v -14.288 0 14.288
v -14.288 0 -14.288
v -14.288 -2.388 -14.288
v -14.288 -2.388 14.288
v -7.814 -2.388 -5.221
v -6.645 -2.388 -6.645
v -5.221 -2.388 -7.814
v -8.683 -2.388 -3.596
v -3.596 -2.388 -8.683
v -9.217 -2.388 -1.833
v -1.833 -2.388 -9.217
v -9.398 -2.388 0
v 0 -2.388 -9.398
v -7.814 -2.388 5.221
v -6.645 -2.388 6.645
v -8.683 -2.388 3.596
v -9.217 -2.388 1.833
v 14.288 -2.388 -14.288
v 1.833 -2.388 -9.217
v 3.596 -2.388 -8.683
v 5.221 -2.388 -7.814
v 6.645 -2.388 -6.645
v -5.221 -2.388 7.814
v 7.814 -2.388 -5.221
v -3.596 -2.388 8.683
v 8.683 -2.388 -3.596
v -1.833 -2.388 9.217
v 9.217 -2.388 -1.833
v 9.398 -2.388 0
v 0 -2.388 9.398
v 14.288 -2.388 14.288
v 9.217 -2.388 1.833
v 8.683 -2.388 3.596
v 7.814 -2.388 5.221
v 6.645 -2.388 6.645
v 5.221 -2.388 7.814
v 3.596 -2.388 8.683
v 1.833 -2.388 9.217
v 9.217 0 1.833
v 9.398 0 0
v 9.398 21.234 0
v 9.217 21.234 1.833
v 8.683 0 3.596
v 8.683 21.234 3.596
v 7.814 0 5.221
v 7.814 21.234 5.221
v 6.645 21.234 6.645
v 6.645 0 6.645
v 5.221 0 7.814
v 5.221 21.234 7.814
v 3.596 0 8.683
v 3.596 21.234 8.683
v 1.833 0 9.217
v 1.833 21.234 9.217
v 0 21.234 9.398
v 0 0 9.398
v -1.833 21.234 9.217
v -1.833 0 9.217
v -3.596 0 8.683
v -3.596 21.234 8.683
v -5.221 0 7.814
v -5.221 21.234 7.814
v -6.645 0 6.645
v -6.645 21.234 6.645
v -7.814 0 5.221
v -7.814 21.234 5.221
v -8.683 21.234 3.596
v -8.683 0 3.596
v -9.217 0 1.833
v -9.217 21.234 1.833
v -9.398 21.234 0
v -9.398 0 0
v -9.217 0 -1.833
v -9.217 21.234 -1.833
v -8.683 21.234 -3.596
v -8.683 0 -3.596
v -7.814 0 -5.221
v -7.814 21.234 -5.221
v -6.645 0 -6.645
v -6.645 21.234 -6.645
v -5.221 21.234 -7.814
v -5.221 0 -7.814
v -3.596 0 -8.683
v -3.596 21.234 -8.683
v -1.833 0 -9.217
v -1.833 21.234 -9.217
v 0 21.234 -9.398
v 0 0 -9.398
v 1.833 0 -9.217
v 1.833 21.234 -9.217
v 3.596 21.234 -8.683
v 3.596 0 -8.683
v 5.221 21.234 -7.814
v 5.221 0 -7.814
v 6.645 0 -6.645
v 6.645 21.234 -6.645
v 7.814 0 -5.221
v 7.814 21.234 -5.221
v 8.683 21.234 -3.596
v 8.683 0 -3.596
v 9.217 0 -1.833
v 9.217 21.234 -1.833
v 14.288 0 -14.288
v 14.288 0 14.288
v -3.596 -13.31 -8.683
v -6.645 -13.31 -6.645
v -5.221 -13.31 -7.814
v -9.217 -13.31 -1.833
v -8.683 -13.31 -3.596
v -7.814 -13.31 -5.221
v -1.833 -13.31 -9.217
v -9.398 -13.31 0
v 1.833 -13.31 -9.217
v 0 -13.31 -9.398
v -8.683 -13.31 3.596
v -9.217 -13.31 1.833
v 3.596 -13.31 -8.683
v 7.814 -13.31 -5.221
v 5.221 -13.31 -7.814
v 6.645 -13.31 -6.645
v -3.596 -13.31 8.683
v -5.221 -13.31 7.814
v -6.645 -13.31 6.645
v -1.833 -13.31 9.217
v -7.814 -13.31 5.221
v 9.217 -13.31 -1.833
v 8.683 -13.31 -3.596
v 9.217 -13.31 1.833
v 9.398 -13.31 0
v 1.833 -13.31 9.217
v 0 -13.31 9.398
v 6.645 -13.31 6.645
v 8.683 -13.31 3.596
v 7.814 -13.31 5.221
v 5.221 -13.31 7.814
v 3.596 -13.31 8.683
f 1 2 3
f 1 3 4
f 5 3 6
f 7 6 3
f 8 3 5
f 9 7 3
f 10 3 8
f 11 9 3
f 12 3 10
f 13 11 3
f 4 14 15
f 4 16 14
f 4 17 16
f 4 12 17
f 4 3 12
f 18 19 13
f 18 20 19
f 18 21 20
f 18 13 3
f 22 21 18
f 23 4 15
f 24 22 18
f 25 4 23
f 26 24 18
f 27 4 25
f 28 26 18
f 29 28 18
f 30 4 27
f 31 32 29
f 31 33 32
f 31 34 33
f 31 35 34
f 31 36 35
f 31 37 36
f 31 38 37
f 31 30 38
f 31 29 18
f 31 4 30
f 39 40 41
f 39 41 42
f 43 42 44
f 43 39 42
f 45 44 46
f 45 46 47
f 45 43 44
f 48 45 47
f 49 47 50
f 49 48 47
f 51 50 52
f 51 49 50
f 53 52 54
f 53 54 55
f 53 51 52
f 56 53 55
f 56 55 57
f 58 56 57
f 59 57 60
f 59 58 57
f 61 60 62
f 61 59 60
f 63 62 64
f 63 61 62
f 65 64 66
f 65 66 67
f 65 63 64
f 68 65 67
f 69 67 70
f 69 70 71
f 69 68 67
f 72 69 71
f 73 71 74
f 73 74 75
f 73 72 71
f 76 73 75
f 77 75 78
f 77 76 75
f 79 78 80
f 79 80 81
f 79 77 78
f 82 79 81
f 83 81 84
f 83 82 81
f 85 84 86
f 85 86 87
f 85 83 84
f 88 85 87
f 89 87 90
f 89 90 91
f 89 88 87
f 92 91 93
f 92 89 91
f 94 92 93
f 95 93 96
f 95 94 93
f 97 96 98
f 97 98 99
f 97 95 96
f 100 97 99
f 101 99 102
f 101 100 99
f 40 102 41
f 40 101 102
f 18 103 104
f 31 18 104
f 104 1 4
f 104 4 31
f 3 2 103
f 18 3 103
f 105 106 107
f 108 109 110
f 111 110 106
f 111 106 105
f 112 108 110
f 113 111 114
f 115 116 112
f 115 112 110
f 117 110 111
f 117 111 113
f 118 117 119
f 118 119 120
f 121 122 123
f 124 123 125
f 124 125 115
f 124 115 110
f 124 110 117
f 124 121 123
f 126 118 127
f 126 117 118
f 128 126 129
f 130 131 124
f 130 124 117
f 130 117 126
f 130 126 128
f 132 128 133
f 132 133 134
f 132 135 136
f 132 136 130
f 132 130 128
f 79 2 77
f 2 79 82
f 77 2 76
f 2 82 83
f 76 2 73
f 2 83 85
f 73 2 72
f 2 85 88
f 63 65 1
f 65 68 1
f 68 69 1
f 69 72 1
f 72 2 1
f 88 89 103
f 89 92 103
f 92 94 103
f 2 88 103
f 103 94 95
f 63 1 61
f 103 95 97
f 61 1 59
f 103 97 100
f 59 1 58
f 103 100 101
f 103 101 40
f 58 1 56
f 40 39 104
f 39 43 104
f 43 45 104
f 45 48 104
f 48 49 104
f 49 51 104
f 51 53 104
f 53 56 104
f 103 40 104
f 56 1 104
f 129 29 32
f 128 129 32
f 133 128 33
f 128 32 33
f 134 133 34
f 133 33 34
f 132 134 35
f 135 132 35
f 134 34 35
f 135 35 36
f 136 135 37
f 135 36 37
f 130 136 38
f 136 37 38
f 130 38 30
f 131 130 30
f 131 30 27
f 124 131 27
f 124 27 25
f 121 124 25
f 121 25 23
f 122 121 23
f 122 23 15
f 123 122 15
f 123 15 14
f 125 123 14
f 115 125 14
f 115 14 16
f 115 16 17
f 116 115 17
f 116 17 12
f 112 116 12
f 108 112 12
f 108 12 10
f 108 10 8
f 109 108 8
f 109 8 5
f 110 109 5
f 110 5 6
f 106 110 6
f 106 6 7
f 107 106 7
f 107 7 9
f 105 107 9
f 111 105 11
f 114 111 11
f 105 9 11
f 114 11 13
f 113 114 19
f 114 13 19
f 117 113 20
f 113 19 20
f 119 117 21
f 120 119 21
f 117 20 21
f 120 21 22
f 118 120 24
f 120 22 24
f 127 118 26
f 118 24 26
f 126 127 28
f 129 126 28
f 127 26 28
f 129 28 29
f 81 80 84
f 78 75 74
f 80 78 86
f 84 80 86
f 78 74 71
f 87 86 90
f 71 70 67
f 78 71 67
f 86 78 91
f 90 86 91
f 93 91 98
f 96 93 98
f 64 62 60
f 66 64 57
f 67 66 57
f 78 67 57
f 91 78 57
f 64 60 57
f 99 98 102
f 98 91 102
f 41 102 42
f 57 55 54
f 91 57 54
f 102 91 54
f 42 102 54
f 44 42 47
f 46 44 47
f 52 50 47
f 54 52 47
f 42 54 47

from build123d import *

# Parameters (mm, degrees)
F0_W          = 28.575
F0_H          = 28.575
F0_R          = 9.398
F1_DEPTH      = 2.3876
F2_DEPTH      = 13.3096
F2_DEPTH_BACK = 21.2344


with BuildPart() as f1:
    # F0 (on Front) → F1 (new body)
    with BuildSketch(Plane.XZ):
        Rectangle(F0_W, F0_H)
        Circle(F0_R, mode=Mode.SUBTRACT)
    extrude(amount=F1_DEPTH)

    # F0 (on Front) → F2 (join, two sides)
    with BuildSketch(Plane.XZ) as f2_sk:
        Circle(F0_R)
    extrude(amount=F2_DEPTH)
    extrude(f2_sk.sketch, amount=-F2_DEPTH_BACK)


solid = f1.part
